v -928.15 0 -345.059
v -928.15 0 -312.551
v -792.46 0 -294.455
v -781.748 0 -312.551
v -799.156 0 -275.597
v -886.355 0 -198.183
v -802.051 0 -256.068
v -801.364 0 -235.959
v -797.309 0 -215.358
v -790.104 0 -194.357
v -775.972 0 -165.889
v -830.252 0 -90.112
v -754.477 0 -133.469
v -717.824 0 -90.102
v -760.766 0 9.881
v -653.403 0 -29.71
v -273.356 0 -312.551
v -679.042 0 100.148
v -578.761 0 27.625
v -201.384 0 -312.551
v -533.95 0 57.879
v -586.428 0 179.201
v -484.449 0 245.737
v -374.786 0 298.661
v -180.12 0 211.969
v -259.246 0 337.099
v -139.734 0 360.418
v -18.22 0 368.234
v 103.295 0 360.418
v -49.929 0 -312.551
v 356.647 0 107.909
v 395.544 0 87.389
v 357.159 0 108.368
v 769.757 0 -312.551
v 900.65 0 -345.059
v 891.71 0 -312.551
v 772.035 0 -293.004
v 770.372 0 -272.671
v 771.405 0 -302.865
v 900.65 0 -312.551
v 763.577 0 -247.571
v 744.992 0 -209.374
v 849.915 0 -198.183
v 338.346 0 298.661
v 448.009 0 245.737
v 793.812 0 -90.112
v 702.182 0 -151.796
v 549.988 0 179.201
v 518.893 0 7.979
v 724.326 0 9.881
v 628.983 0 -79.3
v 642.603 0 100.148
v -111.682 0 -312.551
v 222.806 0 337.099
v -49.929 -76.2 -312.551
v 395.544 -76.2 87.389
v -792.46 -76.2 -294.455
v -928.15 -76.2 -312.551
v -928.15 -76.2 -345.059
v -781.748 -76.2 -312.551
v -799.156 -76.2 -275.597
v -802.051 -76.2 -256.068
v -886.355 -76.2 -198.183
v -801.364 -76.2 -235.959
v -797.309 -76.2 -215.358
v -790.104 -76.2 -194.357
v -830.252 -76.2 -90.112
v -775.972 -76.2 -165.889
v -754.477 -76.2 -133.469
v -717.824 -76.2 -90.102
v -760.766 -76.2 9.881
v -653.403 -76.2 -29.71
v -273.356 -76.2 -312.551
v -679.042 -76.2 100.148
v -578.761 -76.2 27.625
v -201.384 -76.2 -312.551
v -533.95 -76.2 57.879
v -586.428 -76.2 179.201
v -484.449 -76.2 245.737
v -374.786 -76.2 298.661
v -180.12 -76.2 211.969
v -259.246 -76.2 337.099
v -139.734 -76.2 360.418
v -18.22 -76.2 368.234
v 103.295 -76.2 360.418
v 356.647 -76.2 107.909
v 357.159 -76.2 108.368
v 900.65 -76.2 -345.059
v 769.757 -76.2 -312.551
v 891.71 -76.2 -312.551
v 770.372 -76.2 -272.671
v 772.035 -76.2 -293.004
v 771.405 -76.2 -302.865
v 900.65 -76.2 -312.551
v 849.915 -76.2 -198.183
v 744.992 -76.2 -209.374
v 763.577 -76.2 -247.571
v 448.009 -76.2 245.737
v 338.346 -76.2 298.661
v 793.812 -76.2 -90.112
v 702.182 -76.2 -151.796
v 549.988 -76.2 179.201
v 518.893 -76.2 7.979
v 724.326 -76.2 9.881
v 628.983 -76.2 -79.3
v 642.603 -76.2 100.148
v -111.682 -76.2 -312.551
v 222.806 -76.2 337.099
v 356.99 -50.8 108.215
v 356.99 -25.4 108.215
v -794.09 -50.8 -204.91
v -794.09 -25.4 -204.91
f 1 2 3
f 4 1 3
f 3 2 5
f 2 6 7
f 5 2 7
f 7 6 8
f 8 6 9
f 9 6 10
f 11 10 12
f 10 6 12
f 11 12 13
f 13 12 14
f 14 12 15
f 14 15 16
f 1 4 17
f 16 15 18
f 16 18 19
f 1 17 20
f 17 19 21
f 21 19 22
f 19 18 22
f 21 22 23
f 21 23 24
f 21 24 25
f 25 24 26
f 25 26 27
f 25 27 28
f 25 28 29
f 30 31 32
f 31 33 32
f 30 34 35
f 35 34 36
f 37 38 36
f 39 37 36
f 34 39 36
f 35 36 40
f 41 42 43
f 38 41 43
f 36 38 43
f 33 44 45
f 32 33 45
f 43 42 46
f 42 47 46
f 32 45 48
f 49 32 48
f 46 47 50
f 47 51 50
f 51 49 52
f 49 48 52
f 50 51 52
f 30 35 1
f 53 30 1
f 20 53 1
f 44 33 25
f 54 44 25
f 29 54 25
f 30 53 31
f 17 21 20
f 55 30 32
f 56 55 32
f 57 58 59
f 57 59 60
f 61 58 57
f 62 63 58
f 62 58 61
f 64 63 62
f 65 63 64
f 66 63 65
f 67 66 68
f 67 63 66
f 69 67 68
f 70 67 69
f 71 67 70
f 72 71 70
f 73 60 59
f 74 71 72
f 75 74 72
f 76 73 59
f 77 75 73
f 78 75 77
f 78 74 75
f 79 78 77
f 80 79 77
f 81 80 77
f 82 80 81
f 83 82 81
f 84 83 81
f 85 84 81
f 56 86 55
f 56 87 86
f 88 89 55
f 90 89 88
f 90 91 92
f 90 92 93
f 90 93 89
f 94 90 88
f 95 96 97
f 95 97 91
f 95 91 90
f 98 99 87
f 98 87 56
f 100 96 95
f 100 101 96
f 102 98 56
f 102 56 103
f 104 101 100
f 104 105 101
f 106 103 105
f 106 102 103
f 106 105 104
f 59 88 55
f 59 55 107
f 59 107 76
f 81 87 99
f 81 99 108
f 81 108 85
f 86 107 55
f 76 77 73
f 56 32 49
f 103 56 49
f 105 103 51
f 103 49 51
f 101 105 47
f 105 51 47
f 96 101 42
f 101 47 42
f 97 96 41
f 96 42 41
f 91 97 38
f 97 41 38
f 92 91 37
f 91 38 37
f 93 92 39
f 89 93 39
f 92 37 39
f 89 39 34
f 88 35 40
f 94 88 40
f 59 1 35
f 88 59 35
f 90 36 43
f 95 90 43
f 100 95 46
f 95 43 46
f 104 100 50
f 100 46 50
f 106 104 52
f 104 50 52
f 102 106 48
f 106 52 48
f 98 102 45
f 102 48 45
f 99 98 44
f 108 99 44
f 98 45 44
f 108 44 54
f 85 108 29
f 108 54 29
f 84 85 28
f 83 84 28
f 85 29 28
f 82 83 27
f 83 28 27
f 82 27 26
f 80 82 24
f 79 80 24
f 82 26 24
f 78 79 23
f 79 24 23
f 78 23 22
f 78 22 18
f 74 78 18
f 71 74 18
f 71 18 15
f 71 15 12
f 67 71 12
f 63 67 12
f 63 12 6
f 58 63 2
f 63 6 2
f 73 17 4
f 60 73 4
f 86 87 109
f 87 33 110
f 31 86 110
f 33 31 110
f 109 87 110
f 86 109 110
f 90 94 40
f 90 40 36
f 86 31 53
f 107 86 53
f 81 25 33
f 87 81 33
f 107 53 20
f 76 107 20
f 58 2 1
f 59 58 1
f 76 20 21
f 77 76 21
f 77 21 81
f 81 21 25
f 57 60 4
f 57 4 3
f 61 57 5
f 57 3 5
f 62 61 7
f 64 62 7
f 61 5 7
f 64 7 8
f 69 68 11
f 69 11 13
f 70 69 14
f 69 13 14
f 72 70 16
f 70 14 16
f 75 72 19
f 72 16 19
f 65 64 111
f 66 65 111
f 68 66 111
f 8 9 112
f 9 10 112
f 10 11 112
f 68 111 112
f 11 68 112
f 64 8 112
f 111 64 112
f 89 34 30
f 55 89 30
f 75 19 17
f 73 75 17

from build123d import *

# Parameters (mm, degrees)
F1_DEPTH = 76.2


with BuildPart() as f1:
    # F0 (on Front) → F1 (new body)
    with BuildSketch(Plane.XZ):
        with BuildLine():
            Line((900.6498717056, -312.5507702395), (891.7103917568, -312.5507702395))
            ThreePointArc((891.7103917568, -312.5507702395), (-18.2198682688, 368.2339185386), (-928.1501282944, -312.5507702395))
            Line((-928.1501282944, -312.5507702395), (-928.1501282944, -345.05851352))
            Line((-928.1501282944, -345.05851352), (-749.2538985146, -345.05851352))
            add(Edge.make_bspline(
                [(-749.2538985146, -345.0585135201), (-760.7342074403, -336.2080146902), (-770.4190479747, -326.955384148), (-778.1336966335, -317.3006312947)],
                knots=[0.9863041687, 0.9863041687, 0.9863041687, 0.9863041687, 1, 1, 1, 1], degree=3))
            add(Edge.make_bspline(
                [(-778.1336966335, -317.3006312947), (-779.3903781429, -315.7279155528), (-780.5947807249, -314.1445295186), (-781.7476175602, -312.5507702395)],
                knots=[0, 0, 0, 0, 0.0022309892, 0.0022309892, 0.0022309892, 0.0022309892], degree=3))
            add(Edge.make_bspline(
                [(-781.7476175602, -312.5507702395), (-852.1024790666, -215.2874716318), (-730.4075461351, -79.390396257), (-578.7611195863, 27.6247892302)],
                knots=[0.0022309892, 0.0022309892, 0.0022309892, 0.0022309892, 0.1383828997, 0.1383828997, 0.1383828997, 0.1383828997], degree=3))
            add(Edge.make_bspline(
                [(-578.7611195863, 27.6247892302), (-564.0565616619, 38.0016311354), (-549.0703872563, 48.1069134214), (-533.9503839152, 57.8790810031)],
                knots=[0.1383828997, 0.1383828997, 0.1383828997, 0.1383828997, 0.1515850153, 0.1515850153, 0.1515850153, 0.1515850153], degree=3))
            add(Edge.make_bspline(
                [(-533.9503839241, 57.8790809984), (-602.4722852405, 100.7350307252), (-409.6251199582, 190.8667602879), (-180.120050854, 211.9691197295)],
                knots=[0, 0, 0, 0, 0.2694339971, 0.2694339971, 0.2694339971, 0.2694339971], degree=3))
            add(Edge.make_bspline(
                [(-180.1200508538, 211.9691197281), (-93.8173354063, 228.6015651353), (-14.6508277799, 226.1155115237), (65.4117966901, 211.4804253565)],
                knots=[0.2631178936, 0.2631178936, 0.2631178936, 0.2631178936, 0.3555862093, 0.3555862093, 0.3555862093, 0.3555862093], degree=3))
            add(Edge.make_bspline(
                [(65.4117966901, 211.4804253565), (252.144781627, 195.4027277771), (400.2346102312, 147.7404794914), (357.158674228, 108.3680934352)],
                knots=[0.3646274658, 0.3646274658, 0.3646274658, 0.3646274658, 0.5902554086, 0.5902554086, 0.5902554086, 0.5902554086], degree=3))
            add(Edge.make_bspline(
                [(357.1586742266, 108.3680934339), (369.9420280531, 101.672338017), (382.7382890401, 94.6802256262), (395.5442289819, 87.3893097061)],
                knots=[0.4659511905, 0.4659511905, 0.4659511905, 0.4659511905, 0.4802734469, 0.4802734469, 0.4802734469, 0.4802734469], degree=3))
            add(Edge.make_bspline(
                [(395.5442289819, 87.3893097061), (452.0964892557, 55.1919250067), (621.2097193886, -58.1382004272), (789.5300294959, -225.1035077486), (769.7574939756, -312.5507702395)],
                knots=[0.4802734469, 0.4802734469, 0.4802734469, 0.4802734469, 0.5435219059, 0.668781717, 0.668781717, 0.668781717, 0.668781717], degree=3))
            add(Edge.make_bspline(
                [(769.7574939756, -312.5507702395), (767.2117421615, -323.809772753), (762.4841536184, -334.6792525956), (755.294559917, -345.05851352)],
                knots=[0.668781717, 0.668781717, 0.668781717, 0.668781717, 0.6849091576, 0.6849091576, 0.6849091576, 0.6849091576], degree=3))
            Line((755.2945599171, -345.05851352), (900.6498717056, -345.05851352))
            Line((900.6498717056, -345.05851352), (900.6498717056, -312.5507702395))
        make_face()
        with BuildLine():
            add(Edge.make_bspline(
                [(-749.2538985146, -345.0585135201), (-760.7342074403, -336.2080146902), (-770.4190479747, -326.955384148), (-778.1336966335, -317.3006312947)],
                knots=[0.9863041687, 0.9863041687, 0.9863041687, 0.9863041687, 1, 1, 1, 1], degree=3))
            Line((-749.2538985146, -345.05851352), (755.2945599171, -345.05851352))
            add(Edge.make_bspline(
                [(769.7574939756, -312.5507702395), (767.2117421615, -323.809772753), (762.4841536184, -334.6792525956), (755.294559917, -345.05851352)],
                knots=[0.668781717, 0.668781717, 0.668781717, 0.668781717, 0.6849091576, 0.6849091576, 0.6849091576, 0.6849091576], degree=3))
            Line((769.7574939756, -312.5507702395), (-49.9293302995, -312.5507702395))
            Line((-49.9293302995, -312.5507702395), (395.5442289819, 87.3893097061))
            add(Edge.make_bspline(
                [(357.1586742266, 108.3680934339), (369.9420280531, 101.672338017), (382.7382890401, 94.6802256262), (395.5442289819, 87.3893097061)],
                knots=[0.4659511905, 0.4659511905, 0.4659511905, 0.4659511905, 0.4802734469, 0.4802734469, 0.4802734469, 0.4802734469], degree=3))
            add(Edge.make_bspline(
                [(357.158674228, 108.3680934352), (356.9910150595, 108.2148491387), (356.8204599128, 108.0617304257), (356.6470209458, 107.9087381034)],
                knots=[0.5902554086, 0.5902554086, 0.5902554086, 0.5902554086, 0.5911335925, 0.5911335925, 0.5911335925, 0.5911335925], degree=3))
            Line((356.6470209458, 107.9087381034), (-111.6821191112, -312.5507702395))
            Line((-111.6821191112, -312.5507702395), (-201.3835205481, -312.5507702395))
            Line((-201.3835205481, -312.5507702395), (-533.9503839109, 57.8790810059))
            add(Edge.make_bspline(
                [(-578.7611195863, 27.6247892302), (-564.0565616619, 38.0016311354), (-549.0703872563, 48.1069134214), (-533.9503839152, 57.8790810031)],
                knots=[0.1383828997, 0.1383828997, 0.1383828997, 0.1383828997, 0.1515850153, 0.1515850153, 0.1515850153, 0.1515850153], degree=3))
            Line((-578.7611195863, 27.6247892302), (-273.35614635, -312.5507702395))
            Line((-273.35614635, -312.5507702395), (-781.7476175602, -312.5507702395))
            add(Edge.make_bspline(
                [(-778.1336966335, -317.3006312947), (-779.3903781429, -315.7279155528), (-780.5947807249, -314.1445295186), (-781.7476175602, -312.5507702395)],
                knots=[0, 0, 0, 0, 0.0022309892, 0.0022309892, 0.0022309892, 0.0022309892], degree=3))
        make_face()
        with BuildLine():
            Line((-180.120050854, 211.9691197295), (357.1586742266, 108.3680934339))
            add(Edge.make_bspline(
                [(65.4117966901, 211.4804253565), (71.5175240267, 210.3643259746), (167.1573362354, 191.7908820713), (264.946329488, 156.6677270957), (357.1586742266, 108.3680934339)],
                knots=[0.3555862093, 0.3555862093, 0.3555862093, 0.3555862093, 0.3626380181, 0.4659511905, 0.4659511905, 0.4659511905, 0.4659511905], degree=3))
            add(Edge.make_bspline(
                [(-180.120050854, 211.9691197295), (-99.0338336855, 219.424774226), (-13.3717100026, 218.2636800411), (65.4117966901, 211.4804253565)],
                knots=[0.2694339971, 0.2694339971, 0.2694339971, 0.2694339971, 0.3646274658, 0.3646274658, 0.3646274658, 0.3646274658], degree=3))
        make_face()
        with BuildLine():
            add(Edge.make_bspline(
                [(65.4117966901, 211.4804253565), (71.5175240267, 210.3643259746), (167.1573362354, 191.7908820713), (264.946329488, 156.6677270957), (357.1586742266, 108.3680934339)],
                knots=[0.3555862093, 0.3555862093, 0.3555862093, 0.3555862093, 0.3626380181, 0.4659511905, 0.4659511905, 0.4659511905, 0.4659511905], degree=3))
            add(Edge.make_bspline(
                [(65.4117966901, 211.4804253565), (252.144781627, 195.4027277771), (400.2346102312, 147.7404794914), (357.158674228, 108.3680934352)],
                knots=[0.3646274658, 0.3646274658, 0.3646274658, 0.3646274658, 0.5902554086, 0.5902554086, 0.5902554086, 0.5902554086], degree=3))
        make_face()
        with BuildLine():
            add(Edge.make_bspline(
                [(-533.9503839241, 57.8790809984), (-602.4722852405, 100.7350307252), (-409.6251199582, 190.8667602879), (-180.120050854, 211.9691197295)],
                knots=[0, 0, 0, 0, 0.2694339971, 0.2694339971, 0.2694339971, 0.2694339971], degree=3))
            add(Edge.make_bspline(
                [(-533.9503839152, 57.8790810031), (-491.8326282353, 85.1000913023), (-360.9478670377, 159.8172978773), (-249.892894391, 198.5223468773), (-180.1200508538, 211.9691197281)],
                knots=[0.1515850153, 0.1515850153, 0.1515850153, 0.1515850153, 0.1883603696, 0.2631178936, 0.2631178936, 0.2631178936, 0.2631178936], degree=3))
        make_face()
        with BuildLine():
            add(Edge.make_bspline(
                [(-533.9503839152, 57.8790810031), (-491.8326282353, 85.1000913023), (-360.9478670377, 159.8172978773), (-249.892894391, 198.5223468773), (-180.1200508538, 211.9691197281)],
                knots=[0.1515850153, 0.1515850153, 0.1515850153, 0.1515850153, 0.1883603696, 0.2631178936, 0.2631178936, 0.2631178936, 0.2631178936], degree=3))
            Line((-533.9503839109, 57.8790810059), (-180.120050854, 211.9691197295))
        make_face()
        with BuildLine():
            add(Edge.make_bspline(
                [(-180.120050854, 211.9691197295), (-99.0338336855, 219.424774226), (-13.3717100026, 218.2636800411), (65.4117966901, 211.4804253565)],
                knots=[0.2694339971, 0.2694339971, 0.2694339971, 0.2694339971, 0.3646274658, 0.3646274658, 0.3646274658, 0.3646274658], degree=3))
            add(Edge.make_bspline(
                [(-180.1200508538, 211.9691197281), (-93.8173354063, 228.6015651353), (-14.6508277799, 226.1155115237), (65.4117966901, 211.4804253565)],
                knots=[0.2631178936, 0.2631178936, 0.2631178936, 0.2631178936, 0.3555862093, 0.3555862093, 0.3555862093, 0.3555862093], degree=3))
        make_face()
    extrude(amount=F1_DEPTH)


solid = f1.part
